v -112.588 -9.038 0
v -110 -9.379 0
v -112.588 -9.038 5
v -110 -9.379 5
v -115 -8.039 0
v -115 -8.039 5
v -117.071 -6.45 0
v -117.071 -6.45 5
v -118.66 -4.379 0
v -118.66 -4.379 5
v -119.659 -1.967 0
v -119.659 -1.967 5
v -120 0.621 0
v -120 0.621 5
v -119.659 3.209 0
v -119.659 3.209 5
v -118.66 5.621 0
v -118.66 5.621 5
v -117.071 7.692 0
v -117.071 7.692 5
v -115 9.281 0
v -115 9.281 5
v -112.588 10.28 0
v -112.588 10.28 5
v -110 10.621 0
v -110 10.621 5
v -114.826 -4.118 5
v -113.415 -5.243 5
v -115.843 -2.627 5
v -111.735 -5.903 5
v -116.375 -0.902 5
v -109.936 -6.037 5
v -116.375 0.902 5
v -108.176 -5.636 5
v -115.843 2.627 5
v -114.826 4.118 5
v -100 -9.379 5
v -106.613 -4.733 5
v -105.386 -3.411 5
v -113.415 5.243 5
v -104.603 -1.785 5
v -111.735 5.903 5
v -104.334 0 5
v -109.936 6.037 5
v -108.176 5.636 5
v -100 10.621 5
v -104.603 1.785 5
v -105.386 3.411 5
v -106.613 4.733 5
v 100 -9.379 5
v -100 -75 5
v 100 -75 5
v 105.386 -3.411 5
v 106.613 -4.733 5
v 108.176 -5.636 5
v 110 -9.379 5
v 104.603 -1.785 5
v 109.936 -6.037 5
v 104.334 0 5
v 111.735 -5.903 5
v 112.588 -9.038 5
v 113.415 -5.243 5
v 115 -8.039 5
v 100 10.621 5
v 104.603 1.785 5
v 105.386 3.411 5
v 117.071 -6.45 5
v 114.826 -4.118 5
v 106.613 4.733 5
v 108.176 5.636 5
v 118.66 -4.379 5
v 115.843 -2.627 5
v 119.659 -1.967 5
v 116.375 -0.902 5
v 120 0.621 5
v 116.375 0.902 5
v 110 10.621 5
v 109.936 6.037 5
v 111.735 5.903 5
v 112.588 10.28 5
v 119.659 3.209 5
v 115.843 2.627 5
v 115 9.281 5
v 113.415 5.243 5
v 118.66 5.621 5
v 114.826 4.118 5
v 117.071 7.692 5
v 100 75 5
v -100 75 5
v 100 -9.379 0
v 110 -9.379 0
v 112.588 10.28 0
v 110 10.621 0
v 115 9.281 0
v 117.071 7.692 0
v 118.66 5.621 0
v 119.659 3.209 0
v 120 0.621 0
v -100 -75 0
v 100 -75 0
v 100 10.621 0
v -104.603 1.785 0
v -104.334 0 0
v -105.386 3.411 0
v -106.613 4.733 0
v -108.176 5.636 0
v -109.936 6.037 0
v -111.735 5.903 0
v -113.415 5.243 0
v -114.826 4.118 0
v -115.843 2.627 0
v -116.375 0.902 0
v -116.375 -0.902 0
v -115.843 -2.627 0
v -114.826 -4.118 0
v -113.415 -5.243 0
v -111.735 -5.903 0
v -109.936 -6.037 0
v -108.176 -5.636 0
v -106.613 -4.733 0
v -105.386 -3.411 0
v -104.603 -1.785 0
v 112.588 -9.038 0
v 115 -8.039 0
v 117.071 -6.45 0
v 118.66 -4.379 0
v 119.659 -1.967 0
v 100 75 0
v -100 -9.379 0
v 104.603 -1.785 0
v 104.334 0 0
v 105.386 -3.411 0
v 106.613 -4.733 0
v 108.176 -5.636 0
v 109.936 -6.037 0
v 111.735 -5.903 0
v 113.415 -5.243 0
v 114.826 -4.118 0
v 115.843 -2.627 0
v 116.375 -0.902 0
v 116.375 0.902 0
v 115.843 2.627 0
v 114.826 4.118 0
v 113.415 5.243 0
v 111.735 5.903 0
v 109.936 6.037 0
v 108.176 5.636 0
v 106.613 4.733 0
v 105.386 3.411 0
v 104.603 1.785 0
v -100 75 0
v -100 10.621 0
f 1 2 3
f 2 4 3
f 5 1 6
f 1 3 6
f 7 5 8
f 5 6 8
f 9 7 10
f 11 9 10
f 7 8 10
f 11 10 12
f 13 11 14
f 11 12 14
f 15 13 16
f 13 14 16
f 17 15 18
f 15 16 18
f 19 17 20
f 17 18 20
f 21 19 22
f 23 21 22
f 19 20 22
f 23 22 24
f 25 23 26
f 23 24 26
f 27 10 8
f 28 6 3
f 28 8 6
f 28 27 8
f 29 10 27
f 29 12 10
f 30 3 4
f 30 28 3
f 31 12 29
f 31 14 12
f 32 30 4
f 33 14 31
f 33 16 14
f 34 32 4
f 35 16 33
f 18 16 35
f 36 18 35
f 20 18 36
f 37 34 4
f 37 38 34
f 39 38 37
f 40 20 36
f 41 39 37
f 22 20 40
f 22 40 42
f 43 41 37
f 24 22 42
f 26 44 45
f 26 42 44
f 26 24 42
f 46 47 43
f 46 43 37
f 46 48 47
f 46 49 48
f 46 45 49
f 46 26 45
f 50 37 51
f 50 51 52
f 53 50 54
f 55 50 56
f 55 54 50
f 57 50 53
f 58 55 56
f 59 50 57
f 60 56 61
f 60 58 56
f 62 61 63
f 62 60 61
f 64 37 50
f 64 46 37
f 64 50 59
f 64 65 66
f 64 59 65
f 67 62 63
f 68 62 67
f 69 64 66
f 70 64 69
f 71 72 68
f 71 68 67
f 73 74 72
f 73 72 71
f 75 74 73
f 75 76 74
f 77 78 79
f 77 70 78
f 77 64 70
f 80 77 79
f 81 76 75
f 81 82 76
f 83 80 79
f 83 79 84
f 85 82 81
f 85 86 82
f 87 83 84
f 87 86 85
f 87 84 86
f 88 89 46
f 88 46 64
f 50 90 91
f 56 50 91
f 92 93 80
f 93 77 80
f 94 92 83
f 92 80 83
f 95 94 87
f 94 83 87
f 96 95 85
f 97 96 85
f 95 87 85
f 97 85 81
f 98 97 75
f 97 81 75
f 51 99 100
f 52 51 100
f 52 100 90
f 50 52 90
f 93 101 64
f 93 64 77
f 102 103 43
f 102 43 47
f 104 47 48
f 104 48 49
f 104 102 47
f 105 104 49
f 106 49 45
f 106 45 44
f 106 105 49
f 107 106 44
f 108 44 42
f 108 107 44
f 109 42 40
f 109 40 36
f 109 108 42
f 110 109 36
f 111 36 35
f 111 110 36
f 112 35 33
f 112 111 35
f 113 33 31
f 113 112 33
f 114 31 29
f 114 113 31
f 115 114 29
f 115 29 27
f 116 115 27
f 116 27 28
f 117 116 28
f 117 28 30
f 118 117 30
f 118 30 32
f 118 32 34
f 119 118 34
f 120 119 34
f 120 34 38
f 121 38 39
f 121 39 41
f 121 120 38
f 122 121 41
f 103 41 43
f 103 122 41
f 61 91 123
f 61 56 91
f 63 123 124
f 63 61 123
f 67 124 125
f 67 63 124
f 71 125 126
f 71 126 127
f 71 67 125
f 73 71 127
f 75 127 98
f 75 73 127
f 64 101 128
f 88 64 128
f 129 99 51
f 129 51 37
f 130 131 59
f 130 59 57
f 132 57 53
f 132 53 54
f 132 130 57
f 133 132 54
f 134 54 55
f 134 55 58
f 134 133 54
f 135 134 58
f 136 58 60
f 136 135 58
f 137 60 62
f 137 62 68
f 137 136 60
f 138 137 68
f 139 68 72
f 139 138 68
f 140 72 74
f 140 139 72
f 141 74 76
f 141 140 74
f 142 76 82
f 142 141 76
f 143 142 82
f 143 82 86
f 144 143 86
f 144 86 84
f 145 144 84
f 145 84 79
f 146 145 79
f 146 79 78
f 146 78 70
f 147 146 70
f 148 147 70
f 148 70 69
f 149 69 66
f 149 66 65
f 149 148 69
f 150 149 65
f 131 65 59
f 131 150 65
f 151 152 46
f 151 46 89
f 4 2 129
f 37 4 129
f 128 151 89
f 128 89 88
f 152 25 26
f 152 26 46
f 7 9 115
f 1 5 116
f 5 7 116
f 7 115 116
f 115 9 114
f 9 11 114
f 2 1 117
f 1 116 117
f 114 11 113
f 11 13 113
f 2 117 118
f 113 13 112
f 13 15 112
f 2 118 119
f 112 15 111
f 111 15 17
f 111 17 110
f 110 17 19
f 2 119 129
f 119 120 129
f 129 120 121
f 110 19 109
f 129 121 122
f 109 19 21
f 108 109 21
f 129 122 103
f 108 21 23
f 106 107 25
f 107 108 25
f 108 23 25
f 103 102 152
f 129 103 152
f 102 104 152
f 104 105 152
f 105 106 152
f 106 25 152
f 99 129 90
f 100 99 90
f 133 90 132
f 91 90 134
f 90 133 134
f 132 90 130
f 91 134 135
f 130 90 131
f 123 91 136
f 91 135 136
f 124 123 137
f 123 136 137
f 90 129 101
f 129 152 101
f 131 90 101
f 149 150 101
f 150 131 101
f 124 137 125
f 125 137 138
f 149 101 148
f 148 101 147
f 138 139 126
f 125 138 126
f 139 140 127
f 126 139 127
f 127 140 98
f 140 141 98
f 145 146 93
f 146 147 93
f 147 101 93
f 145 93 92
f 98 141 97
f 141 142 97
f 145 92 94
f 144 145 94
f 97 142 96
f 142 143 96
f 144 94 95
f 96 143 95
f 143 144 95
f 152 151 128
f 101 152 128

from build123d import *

# Parameters (mm, degrees)
SKETCH_1_W      = 200
SKETCH_1_H      = 150
EXTRUDE_1_DEPTH = 5
SKETCH_2_W      = 20
SKETCH_2_H      = 20
SKETCH_2_R      = 6.054352045
EXTRUDE_2_DEPTH = 5
FILLET_1_R      = 10


with BuildPart() as part:
    # 草图1 → 凸台-拉伸1 (new body)
    with BuildSketch(Plane.XY):
        Rectangle(SKETCH_1_W, SKETCH_1_H)
    extrude(amount=EXTRUDE_1_DEPTH)

    # 草图2 → 凸台-拉伸2 (add)
    # profile 1 of 2: a face of its own
    with BuildSketch(Plane.XY):
        with Locations((-110, 0.621152281)):
            Rectangle(SKETCH_2_W, SKETCH_2_H)
        with Locations((-110.38820767, 0)):
            Circle(SKETCH_2_R, mode=Mode.SUBTRACT)
    # profile 2 of 2: a face of its own
    with BuildSketch(Plane.XY):
        with Locations((110, 0.621152281)):
            Rectangle(SKETCH_2_W, SKETCH_2_H)
        with Locations(Location((110.38820767, 0, 0), (0, 0, 180))):
            Circle(SKETCH_2_R, mode=Mode.SUBTRACT)
    extrude(amount=EXTRUDE_2_DEPTH)

    # 圆角1
    fillet_1_edges = [part.edges().sort_by_distance(p)[0] for p in [
        (120, -9.378847719, 2.5),
        (120, 10.621152281, 2.5),
        (-120, -9.378847719, 2.5),
        (-120, 10.621152281, 2.5),
    ]]
    fillet(fillet_1_edges, radius=FILLET_1_R - 0.0001)  # a hair under: the kernel refuses the full size


solid = part.part
